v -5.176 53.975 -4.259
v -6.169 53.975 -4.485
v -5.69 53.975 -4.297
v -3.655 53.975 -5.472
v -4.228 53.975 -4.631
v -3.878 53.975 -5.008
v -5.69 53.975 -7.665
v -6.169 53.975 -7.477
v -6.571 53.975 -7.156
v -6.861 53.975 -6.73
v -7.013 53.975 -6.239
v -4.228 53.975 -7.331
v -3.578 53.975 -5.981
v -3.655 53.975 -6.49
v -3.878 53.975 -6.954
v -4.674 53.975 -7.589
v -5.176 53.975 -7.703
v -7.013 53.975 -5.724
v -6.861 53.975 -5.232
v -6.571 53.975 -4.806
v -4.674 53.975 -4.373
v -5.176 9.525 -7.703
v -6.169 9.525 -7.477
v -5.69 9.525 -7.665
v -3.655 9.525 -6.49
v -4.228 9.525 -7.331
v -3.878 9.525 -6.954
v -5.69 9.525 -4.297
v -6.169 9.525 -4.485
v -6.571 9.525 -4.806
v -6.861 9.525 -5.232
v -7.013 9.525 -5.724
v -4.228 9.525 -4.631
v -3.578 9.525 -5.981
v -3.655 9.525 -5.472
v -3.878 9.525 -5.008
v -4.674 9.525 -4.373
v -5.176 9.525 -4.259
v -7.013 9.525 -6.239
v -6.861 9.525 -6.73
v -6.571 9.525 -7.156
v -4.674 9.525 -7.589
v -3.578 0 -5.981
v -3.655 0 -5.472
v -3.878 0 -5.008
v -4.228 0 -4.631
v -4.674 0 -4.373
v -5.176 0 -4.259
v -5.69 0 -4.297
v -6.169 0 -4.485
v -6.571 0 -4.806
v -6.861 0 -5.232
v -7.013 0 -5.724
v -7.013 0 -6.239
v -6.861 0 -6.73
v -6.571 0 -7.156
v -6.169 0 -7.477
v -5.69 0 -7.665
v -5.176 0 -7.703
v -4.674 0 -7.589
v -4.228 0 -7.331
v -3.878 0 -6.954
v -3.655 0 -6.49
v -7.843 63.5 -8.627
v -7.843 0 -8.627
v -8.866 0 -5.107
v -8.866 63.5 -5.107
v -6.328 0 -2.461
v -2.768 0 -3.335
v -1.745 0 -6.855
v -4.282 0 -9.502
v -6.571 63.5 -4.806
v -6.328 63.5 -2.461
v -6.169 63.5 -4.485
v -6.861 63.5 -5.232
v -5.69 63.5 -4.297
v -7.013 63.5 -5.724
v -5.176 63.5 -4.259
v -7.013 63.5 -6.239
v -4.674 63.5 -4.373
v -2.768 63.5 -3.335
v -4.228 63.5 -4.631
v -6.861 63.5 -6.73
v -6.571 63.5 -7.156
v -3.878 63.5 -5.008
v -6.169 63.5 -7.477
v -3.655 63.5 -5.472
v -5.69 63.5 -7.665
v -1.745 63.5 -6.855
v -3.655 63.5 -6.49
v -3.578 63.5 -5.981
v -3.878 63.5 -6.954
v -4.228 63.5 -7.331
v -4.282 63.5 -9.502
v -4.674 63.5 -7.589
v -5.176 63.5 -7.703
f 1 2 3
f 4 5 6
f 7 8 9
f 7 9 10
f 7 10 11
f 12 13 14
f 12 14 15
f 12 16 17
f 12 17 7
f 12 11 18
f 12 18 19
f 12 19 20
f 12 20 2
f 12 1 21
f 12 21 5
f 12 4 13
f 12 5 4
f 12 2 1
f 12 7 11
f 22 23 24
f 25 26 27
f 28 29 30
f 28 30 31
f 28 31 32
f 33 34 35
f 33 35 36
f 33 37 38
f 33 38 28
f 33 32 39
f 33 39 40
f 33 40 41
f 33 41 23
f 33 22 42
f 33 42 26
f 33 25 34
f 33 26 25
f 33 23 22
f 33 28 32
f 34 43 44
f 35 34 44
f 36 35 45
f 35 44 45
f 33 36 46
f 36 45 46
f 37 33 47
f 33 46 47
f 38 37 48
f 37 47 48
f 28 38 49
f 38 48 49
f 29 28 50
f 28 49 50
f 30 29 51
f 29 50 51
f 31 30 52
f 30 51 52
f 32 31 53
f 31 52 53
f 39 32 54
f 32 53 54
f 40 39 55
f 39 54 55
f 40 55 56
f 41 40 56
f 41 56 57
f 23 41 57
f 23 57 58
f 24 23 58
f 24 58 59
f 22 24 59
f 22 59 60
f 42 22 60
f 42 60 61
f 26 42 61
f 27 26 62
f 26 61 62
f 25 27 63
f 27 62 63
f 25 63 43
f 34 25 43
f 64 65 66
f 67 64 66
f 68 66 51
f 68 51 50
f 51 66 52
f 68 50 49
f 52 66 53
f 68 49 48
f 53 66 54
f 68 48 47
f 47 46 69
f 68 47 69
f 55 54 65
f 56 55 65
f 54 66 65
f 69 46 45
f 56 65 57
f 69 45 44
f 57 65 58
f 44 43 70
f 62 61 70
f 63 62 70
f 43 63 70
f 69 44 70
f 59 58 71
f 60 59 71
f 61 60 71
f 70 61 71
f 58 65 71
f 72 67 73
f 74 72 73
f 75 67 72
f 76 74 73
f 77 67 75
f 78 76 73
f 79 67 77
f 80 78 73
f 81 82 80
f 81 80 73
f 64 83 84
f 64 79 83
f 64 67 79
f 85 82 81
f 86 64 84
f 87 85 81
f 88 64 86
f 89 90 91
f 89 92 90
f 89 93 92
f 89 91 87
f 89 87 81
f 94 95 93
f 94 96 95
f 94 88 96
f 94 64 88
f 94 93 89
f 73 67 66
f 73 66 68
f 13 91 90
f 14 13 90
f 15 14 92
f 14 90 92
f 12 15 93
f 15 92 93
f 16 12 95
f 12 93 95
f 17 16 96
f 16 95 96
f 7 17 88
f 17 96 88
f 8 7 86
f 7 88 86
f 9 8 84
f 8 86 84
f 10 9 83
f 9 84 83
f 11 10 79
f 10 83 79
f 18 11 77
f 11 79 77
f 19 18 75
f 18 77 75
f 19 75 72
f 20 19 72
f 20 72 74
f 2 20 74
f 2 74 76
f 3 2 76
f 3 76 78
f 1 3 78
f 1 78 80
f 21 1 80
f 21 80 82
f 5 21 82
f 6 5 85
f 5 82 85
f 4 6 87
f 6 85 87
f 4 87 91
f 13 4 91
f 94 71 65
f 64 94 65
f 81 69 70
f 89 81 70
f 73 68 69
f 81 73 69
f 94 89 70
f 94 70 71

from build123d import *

# Parameters (mm, degrees)
BOSS_EXTRUDE1_DEPTH = 63.5
SKETCH2_R           = 1.7272
CUT_EXTRUDE1_DEPTH  = 9.525
SKETCH3_R           = 1.7272
CUT_EXTRUDE2_DEPTH  = 9.525


with BuildPart() as part:
    # Sketch1 → Boss-Extrude1 (new body)
    with BuildSketch(Plane(origin=(0, 0, 0), x_dir=(1, 0, 0), z_dir=(0, 1, 0))):
        Polygon((-2.767735883, 3.334911674), (-1.744793251, 6.855482892), (-4.282226046, 9.501662807), (-7.842601473, 8.627271504), (-8.865544105, 5.106700285), (-6.32811131, 2.46052037), align=None)
    extrude(amount=BOSS_EXTRUDE1_DEPTH)

    # Sketch2 → Cut-Extrude1 (cut)
    with BuildSketch(Plane(origin=(0, 63.5, 0), x_dir=(1, 0, 0), z_dir=(0, 1, 0))):
        with Locations((-5.305168678, 5.981091589)):
            Circle(SKETCH2_R)
    extrude(amount=-CUT_EXTRUDE1_DEPTH, mode=Mode.SUBTRACT)

    # Sketch3 → Cut-Extrude2 (cut)
    with BuildSketch(Plane.XZ):
        with Locations((-5.305168678, -5.981091589)):
            Circle(SKETCH3_R)
    extrude(amount=-CUT_EXTRUDE2_DEPTH, mode=Mode.SUBTRACT)


solid = part.part
